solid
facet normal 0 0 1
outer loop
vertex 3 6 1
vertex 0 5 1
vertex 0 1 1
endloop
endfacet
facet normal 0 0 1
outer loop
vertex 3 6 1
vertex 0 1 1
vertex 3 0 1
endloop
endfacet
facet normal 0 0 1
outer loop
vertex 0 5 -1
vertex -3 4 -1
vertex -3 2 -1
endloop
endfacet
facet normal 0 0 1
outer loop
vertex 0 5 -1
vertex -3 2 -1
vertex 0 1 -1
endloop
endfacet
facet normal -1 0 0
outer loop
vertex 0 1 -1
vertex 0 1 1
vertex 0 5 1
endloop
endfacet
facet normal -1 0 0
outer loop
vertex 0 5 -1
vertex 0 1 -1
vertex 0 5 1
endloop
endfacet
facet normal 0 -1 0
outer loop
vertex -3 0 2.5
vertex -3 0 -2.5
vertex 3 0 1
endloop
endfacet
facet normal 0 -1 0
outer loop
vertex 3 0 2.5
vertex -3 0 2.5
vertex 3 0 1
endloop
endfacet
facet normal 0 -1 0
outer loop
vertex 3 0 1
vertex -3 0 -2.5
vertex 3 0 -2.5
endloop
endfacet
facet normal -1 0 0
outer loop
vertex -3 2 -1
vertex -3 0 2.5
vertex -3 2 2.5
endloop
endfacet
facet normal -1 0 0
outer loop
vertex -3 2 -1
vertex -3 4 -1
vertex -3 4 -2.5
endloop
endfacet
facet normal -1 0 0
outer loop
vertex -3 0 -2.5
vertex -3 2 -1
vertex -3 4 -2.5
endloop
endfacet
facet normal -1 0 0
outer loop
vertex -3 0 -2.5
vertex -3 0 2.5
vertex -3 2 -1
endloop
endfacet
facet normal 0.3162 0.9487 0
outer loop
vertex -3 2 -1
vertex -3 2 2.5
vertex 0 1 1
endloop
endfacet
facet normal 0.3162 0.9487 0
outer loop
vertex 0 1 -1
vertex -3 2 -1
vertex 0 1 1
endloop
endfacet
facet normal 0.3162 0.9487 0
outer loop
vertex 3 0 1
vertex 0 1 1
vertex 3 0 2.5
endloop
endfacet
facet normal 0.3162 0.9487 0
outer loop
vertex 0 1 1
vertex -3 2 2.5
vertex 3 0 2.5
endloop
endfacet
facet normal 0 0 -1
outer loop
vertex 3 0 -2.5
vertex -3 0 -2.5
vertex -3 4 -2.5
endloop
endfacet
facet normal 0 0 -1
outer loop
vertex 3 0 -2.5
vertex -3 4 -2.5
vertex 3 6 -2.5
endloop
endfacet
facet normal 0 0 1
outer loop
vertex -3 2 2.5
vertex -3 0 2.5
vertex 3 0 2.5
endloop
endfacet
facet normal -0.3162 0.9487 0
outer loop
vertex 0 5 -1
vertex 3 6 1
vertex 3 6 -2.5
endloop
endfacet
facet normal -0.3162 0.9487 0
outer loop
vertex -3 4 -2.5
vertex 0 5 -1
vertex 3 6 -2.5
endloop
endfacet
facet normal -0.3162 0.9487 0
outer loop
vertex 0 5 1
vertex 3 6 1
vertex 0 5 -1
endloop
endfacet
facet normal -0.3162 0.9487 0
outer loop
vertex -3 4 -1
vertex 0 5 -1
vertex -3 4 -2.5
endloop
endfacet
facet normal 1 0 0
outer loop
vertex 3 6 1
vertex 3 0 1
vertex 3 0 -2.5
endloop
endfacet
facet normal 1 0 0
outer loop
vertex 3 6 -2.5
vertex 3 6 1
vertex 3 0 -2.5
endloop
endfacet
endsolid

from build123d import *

# Parameters (mm, degrees)
SKETCH1_W           = 6
SKETCH1_H           = 5
BOSS_EXTRUDE1_DEPTH = 6
CUT_EXTRUDE1_DEPTH  = 3.5
CUT_EXTRUDE2_DEPTH  = 1.5
CUT_EXTRUDE3_DEPTH  = 11.5


with BuildPart() as part:
    # Sketch1 → Boss-Extrude1 (new body)
    with BuildSketch(Plane(origin=(0, 0, 0), x_dir=(1, 0, 0), z_dir=(0, 1, 0))):
        Rectangle(SKETCH1_W, SKETCH1_H)
    extrude(amount=BOSS_EXTRUDE1_DEPTH)

    # Sketch2 → Cut-Extrude1 (cut)
    with BuildSketch(Plane.XY.offset(2.5)):
        Polygon((-3, 6), (-3, 2), (0, 1), (0, 6), align=None)
    extrude(amount=-CUT_EXTRUDE1_DEPTH, mode=Mode.SUBTRACT)

    # Sketch3 → Cut-Extrude2 (cut)
    with BuildSketch(Plane.XY.offset(2.5)):
        Polygon((0, 1), (3, 0), (3, 6), (0, 6), align=None)
    extrude(amount=-CUT_EXTRUDE2_DEPTH, mode=Mode.SUBTRACT)

    # Sketch4 → Cut-Extrude3 (cut)
    with BuildSketch(Plane.XY.offset(1)):
        Polygon((3, 6), (-3, 4), (-3, 6), align=None)
    extrude(amount=-CUT_EXTRUDE3_DEPTH, mode=Mode.SUBTRACT)


solid = part.part
